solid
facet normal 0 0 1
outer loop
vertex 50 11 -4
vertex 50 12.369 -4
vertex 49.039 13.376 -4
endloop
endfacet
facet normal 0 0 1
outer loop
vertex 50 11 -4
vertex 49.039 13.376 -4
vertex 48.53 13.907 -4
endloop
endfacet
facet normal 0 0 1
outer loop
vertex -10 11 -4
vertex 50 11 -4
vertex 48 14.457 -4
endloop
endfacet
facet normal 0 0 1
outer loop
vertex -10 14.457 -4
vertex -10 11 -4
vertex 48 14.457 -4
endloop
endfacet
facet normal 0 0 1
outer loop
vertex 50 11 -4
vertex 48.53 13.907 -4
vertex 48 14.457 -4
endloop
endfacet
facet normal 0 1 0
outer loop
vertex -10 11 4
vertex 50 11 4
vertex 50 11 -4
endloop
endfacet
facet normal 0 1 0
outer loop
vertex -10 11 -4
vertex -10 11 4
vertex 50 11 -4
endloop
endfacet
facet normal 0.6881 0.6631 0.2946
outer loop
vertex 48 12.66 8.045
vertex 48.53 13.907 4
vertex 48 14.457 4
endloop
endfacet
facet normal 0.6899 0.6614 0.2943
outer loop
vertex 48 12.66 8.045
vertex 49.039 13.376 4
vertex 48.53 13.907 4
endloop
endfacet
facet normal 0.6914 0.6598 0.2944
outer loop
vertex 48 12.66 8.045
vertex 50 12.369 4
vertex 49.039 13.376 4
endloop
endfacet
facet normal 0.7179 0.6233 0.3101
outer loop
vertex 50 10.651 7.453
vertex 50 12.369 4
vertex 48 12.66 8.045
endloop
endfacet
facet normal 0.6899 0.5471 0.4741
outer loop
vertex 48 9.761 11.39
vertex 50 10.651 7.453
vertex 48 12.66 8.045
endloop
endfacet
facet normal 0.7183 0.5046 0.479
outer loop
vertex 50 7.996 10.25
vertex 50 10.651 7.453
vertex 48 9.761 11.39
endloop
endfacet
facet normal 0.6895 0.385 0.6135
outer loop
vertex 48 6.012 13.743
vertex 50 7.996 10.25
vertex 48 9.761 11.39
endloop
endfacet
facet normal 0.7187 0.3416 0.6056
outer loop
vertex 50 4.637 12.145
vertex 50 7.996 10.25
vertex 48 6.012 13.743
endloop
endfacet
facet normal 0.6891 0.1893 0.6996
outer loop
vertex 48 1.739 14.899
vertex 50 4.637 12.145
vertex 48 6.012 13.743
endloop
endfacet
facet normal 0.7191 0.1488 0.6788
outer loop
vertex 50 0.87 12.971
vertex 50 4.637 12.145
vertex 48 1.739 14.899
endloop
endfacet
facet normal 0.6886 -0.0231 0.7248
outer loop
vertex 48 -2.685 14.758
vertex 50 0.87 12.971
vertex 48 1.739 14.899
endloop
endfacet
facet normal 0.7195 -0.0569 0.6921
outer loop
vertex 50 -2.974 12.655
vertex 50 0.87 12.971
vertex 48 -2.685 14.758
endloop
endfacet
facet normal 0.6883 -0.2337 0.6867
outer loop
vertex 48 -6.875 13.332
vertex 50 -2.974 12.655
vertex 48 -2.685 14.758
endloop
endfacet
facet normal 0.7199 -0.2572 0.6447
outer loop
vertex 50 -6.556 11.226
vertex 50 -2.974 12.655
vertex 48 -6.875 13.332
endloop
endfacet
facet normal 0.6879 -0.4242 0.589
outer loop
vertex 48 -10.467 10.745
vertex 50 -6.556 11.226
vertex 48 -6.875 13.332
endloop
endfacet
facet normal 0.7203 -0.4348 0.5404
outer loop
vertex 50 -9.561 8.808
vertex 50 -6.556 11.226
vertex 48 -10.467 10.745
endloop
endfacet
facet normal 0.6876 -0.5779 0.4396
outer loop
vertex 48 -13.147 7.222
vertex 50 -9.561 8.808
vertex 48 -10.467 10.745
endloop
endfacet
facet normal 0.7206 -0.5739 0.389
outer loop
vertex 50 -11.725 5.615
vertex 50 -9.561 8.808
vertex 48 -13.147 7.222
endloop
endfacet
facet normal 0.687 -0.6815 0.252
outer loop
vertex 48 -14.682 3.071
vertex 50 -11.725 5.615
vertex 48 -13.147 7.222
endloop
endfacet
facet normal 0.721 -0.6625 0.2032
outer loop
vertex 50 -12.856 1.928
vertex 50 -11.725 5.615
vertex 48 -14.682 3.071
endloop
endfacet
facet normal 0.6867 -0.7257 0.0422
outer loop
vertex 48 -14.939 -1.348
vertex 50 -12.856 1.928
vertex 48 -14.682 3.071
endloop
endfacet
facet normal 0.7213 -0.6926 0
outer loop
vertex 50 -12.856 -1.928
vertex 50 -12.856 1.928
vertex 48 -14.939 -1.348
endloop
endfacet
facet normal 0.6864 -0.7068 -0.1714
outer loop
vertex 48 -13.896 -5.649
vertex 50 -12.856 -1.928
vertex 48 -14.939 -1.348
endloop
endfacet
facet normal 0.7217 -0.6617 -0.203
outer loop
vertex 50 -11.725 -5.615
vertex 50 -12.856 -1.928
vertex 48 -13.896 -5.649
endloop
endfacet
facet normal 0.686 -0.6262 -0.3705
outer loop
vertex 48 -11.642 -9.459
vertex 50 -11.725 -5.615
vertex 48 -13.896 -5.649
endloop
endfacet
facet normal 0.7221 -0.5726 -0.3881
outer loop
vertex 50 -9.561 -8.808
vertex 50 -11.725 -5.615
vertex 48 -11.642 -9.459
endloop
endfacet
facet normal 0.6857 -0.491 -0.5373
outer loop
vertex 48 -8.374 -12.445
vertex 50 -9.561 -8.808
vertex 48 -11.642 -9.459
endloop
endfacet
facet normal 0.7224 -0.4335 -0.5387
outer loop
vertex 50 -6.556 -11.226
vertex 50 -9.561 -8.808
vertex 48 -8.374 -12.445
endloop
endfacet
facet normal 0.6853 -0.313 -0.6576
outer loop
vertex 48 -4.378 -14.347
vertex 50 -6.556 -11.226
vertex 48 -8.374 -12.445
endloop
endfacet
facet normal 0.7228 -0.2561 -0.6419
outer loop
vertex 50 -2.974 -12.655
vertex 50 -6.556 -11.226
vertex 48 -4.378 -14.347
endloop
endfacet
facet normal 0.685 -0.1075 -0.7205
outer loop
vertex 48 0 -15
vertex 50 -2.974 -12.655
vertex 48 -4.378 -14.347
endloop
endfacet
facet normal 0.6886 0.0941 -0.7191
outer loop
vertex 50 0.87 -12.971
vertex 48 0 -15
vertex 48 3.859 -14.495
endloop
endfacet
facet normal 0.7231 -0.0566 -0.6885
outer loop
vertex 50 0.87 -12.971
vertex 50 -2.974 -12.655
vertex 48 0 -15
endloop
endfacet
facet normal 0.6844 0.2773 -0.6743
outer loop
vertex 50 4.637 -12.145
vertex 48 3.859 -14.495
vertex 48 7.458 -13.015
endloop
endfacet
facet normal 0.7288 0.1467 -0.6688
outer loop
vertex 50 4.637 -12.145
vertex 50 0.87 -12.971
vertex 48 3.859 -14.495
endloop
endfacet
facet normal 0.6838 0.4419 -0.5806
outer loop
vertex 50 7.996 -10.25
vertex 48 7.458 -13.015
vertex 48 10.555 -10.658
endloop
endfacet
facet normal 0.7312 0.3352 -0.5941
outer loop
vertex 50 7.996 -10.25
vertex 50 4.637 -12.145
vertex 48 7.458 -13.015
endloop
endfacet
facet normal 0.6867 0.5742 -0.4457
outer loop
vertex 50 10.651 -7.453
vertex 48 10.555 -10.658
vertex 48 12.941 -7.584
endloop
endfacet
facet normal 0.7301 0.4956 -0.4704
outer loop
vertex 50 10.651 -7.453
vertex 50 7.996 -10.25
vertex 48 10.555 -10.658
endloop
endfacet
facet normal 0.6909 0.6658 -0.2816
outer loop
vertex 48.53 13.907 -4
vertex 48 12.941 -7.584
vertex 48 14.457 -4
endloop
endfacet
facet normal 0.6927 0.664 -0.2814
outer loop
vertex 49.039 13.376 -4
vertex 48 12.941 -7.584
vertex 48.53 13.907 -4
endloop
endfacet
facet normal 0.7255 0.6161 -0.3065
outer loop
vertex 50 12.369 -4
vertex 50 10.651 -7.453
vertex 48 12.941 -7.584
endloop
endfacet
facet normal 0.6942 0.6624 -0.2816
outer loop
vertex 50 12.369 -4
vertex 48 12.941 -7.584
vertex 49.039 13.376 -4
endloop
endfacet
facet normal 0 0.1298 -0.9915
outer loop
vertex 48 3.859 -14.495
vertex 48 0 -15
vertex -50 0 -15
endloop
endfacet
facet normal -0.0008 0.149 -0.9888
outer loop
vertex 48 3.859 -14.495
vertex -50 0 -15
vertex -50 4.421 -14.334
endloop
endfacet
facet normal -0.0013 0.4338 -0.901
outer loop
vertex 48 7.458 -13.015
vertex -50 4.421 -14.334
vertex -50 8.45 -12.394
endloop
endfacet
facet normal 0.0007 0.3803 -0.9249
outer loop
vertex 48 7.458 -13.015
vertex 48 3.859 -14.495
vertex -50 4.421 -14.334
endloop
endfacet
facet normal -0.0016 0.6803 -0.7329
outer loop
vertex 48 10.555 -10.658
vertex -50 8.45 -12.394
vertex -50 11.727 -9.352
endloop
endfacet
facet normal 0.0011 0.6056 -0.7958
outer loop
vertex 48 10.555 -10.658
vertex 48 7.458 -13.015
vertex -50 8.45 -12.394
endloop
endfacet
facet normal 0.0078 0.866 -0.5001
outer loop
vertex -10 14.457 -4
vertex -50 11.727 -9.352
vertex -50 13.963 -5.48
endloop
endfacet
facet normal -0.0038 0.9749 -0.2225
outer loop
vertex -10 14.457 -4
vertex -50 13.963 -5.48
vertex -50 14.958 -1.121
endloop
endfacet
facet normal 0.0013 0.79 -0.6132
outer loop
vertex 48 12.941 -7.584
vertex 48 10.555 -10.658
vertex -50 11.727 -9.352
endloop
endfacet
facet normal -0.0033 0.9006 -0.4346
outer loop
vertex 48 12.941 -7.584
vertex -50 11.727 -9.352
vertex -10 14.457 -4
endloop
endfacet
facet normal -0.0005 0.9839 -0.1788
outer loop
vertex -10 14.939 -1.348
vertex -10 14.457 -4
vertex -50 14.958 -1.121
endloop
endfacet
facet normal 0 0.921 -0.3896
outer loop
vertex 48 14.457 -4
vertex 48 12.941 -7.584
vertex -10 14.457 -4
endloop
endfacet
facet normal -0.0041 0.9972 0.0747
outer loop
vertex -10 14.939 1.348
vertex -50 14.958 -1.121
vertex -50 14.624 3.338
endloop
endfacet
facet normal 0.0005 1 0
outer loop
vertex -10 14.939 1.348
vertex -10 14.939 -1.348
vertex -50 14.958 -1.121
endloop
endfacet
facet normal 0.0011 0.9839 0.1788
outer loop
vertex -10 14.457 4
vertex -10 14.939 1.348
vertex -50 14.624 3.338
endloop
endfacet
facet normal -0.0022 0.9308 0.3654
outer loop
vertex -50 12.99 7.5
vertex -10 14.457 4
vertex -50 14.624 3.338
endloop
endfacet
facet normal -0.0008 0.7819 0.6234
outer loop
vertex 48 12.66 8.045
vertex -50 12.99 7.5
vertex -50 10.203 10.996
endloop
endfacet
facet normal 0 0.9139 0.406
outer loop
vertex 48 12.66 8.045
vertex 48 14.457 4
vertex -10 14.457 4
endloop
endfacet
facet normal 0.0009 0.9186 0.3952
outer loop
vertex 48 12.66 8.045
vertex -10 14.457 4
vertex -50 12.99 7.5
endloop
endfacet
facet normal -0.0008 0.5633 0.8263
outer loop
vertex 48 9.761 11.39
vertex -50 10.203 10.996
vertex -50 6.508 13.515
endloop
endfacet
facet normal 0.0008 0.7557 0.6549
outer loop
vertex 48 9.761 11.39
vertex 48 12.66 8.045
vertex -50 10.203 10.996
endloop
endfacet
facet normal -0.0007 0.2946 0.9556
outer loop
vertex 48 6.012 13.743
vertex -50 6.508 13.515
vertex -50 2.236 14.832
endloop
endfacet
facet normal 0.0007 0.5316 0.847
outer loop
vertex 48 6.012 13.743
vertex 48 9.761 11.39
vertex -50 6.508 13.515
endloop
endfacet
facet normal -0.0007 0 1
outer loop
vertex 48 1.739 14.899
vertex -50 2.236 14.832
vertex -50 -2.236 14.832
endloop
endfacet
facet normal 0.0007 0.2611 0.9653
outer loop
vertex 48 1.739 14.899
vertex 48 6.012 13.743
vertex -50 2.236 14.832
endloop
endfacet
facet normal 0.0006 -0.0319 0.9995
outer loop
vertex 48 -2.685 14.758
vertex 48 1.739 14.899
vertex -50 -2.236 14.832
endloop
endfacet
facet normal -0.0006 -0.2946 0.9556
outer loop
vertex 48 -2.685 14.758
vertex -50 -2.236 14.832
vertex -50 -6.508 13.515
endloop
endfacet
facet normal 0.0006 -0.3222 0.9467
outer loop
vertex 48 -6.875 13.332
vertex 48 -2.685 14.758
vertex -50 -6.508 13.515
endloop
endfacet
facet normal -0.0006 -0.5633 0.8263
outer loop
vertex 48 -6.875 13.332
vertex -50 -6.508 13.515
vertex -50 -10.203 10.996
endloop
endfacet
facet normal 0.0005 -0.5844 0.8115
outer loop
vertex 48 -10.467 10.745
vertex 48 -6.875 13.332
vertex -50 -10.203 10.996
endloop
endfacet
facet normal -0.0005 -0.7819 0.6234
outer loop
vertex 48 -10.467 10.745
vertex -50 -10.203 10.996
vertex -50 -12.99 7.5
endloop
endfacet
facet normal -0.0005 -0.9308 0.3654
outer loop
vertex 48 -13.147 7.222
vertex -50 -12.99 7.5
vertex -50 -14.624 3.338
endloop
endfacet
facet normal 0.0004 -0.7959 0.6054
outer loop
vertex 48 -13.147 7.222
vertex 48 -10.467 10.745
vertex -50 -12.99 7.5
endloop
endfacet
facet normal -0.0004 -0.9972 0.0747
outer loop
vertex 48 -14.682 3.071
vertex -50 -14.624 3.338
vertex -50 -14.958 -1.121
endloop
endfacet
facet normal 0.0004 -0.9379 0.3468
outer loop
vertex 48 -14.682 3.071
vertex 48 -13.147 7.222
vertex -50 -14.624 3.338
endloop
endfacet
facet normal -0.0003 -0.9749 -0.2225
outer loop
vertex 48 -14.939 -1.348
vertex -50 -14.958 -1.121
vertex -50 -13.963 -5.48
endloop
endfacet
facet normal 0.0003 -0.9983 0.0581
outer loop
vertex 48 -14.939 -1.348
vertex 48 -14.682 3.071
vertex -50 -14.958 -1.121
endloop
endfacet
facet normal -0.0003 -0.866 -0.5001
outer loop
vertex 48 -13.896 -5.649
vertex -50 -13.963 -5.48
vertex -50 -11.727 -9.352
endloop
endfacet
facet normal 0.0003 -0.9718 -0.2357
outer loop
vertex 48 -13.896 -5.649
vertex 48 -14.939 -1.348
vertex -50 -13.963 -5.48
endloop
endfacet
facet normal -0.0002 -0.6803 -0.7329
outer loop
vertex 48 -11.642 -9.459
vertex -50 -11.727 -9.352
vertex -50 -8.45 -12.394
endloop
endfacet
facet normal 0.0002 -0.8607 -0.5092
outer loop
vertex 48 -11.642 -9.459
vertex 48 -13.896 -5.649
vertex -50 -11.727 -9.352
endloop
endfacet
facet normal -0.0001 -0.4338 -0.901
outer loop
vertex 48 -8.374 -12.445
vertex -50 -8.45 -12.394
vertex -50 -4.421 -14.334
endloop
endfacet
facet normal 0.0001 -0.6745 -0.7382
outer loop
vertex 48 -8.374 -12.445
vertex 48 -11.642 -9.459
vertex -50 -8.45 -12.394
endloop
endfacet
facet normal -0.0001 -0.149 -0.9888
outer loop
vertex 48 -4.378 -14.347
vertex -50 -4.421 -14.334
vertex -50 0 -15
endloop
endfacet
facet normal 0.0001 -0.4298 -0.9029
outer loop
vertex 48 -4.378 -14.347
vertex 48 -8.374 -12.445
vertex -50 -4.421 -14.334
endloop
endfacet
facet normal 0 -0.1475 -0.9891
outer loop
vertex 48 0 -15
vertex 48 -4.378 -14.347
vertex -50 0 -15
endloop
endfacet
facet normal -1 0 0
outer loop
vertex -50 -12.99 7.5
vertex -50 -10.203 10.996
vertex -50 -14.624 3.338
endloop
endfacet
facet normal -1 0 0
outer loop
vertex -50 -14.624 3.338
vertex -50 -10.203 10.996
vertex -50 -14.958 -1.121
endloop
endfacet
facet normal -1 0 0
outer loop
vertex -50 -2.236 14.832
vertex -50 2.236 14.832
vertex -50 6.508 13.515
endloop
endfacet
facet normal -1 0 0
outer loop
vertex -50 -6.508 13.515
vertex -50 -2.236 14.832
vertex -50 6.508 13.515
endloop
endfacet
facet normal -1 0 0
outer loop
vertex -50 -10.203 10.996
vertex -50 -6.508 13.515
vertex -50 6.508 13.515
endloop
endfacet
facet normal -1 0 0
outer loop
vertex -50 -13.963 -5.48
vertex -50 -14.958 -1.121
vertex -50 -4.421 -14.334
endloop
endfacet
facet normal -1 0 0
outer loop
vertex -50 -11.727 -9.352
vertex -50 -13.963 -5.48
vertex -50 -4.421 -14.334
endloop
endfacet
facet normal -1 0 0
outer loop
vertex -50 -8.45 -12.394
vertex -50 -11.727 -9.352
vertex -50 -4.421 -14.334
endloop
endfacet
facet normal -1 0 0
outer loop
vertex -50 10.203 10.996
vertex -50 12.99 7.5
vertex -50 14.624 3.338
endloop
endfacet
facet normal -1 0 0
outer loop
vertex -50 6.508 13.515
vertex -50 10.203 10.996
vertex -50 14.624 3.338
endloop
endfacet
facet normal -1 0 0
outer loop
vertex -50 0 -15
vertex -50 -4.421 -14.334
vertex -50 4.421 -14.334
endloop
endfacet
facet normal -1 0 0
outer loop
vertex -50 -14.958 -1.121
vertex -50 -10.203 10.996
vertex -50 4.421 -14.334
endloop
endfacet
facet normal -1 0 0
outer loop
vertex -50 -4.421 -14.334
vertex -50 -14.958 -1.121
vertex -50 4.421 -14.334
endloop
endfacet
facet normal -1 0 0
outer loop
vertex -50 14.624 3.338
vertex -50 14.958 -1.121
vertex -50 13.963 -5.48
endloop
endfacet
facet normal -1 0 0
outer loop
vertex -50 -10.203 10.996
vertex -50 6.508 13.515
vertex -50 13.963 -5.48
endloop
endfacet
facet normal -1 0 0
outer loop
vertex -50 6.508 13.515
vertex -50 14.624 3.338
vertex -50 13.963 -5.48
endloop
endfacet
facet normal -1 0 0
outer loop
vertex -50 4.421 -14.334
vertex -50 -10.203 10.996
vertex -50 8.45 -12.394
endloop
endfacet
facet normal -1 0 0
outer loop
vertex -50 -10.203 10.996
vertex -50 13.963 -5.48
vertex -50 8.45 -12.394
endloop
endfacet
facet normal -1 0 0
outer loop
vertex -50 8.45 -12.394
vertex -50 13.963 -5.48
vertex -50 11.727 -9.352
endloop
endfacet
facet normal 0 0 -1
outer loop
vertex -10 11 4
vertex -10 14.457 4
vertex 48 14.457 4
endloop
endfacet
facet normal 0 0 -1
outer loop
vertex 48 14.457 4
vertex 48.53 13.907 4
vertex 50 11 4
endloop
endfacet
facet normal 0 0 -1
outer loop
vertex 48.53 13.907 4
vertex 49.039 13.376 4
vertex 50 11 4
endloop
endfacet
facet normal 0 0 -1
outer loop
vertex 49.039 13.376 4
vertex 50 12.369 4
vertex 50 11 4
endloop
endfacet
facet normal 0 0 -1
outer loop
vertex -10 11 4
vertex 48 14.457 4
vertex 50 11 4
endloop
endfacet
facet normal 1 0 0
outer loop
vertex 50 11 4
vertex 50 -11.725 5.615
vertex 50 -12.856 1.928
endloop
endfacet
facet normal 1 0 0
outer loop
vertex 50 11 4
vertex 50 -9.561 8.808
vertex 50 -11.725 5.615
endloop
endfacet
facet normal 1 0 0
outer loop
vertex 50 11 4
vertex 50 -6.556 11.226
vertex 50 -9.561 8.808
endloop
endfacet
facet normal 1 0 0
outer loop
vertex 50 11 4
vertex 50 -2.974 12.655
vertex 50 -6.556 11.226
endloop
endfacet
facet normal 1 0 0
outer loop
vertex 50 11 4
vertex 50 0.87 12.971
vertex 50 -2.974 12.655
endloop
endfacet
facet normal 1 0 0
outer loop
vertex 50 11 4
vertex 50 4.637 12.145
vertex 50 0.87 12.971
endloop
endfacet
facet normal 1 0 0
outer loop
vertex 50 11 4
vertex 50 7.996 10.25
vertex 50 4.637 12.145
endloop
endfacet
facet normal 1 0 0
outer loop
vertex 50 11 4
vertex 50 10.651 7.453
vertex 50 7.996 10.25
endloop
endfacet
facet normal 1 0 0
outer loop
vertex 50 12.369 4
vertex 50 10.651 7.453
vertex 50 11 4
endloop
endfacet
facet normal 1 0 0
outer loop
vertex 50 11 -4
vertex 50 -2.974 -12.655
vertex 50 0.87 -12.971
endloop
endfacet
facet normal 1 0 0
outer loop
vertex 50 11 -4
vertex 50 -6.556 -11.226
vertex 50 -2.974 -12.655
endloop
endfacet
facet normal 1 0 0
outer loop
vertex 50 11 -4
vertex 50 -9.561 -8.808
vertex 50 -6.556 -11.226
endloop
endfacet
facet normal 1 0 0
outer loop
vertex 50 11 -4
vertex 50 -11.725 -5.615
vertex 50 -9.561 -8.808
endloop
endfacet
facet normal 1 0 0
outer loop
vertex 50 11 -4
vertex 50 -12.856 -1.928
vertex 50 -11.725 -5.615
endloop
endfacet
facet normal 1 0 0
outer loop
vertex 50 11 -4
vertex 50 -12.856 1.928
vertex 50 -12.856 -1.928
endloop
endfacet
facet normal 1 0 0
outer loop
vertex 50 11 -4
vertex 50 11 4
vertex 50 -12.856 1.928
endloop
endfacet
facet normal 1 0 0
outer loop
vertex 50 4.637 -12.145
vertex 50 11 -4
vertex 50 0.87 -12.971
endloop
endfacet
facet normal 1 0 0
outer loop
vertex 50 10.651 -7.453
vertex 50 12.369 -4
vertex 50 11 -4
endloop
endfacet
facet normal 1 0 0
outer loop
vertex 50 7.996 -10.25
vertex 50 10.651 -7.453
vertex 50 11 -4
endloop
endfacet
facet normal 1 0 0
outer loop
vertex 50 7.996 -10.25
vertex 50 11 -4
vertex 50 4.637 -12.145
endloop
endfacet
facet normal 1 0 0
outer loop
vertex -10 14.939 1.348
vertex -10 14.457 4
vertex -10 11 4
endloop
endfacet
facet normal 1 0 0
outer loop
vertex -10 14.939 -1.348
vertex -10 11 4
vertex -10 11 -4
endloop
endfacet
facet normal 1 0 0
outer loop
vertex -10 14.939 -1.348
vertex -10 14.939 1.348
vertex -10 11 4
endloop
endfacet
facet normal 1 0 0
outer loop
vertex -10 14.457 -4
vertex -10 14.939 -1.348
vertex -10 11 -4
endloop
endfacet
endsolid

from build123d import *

# Parameters (mm, degrees)
SKETCH1_R           = 15
BOSS_EXTRUDE1_DEPTH = 50
CUT_EXTRUDE1_DEPTH  = 60
CHAMFER1_SIZE       = 2


with BuildPart() as part:
    # Sketch1 → Boss-Extrude1 (new, symmetric)
    with BuildSketch(Plane(origin=(0, 0, 0), x_dir=(0, 0, -1), z_dir=(1, 0, 0))):
        Circle(SKETCH1_R)
    extrude(amount=BOSS_EXTRUDE1_DEPTH, both=True)

    # Sketch2 → Cut-Extrude1 (cut)
    with BuildSketch(Plane(origin=(50, 0, 0), x_dir=(0, 0, -1), z_dir=(1, 0, 0))):
        Polygon((-4, 94.562608629), (-4, 14.456832295), (-4, 11), (4, 11), (4, 14.456832295), (4, 94.562608629), (4, 254.774161296), (-4, 254.774161296), align=None)
    extrude(amount=-CUT_EXTRUDE1_DEPTH, mode=Mode.SUBTRACT)

    # Chamfer1
    chamfer1_edges = [part.edges().sort_by_distance(p)[0] for p in [
        (50, -11.937336386, 9.082951062),
    ]]
    chamfer(chamfer1_edges, length=CHAMFER1_SIZE)


solid = part.part
